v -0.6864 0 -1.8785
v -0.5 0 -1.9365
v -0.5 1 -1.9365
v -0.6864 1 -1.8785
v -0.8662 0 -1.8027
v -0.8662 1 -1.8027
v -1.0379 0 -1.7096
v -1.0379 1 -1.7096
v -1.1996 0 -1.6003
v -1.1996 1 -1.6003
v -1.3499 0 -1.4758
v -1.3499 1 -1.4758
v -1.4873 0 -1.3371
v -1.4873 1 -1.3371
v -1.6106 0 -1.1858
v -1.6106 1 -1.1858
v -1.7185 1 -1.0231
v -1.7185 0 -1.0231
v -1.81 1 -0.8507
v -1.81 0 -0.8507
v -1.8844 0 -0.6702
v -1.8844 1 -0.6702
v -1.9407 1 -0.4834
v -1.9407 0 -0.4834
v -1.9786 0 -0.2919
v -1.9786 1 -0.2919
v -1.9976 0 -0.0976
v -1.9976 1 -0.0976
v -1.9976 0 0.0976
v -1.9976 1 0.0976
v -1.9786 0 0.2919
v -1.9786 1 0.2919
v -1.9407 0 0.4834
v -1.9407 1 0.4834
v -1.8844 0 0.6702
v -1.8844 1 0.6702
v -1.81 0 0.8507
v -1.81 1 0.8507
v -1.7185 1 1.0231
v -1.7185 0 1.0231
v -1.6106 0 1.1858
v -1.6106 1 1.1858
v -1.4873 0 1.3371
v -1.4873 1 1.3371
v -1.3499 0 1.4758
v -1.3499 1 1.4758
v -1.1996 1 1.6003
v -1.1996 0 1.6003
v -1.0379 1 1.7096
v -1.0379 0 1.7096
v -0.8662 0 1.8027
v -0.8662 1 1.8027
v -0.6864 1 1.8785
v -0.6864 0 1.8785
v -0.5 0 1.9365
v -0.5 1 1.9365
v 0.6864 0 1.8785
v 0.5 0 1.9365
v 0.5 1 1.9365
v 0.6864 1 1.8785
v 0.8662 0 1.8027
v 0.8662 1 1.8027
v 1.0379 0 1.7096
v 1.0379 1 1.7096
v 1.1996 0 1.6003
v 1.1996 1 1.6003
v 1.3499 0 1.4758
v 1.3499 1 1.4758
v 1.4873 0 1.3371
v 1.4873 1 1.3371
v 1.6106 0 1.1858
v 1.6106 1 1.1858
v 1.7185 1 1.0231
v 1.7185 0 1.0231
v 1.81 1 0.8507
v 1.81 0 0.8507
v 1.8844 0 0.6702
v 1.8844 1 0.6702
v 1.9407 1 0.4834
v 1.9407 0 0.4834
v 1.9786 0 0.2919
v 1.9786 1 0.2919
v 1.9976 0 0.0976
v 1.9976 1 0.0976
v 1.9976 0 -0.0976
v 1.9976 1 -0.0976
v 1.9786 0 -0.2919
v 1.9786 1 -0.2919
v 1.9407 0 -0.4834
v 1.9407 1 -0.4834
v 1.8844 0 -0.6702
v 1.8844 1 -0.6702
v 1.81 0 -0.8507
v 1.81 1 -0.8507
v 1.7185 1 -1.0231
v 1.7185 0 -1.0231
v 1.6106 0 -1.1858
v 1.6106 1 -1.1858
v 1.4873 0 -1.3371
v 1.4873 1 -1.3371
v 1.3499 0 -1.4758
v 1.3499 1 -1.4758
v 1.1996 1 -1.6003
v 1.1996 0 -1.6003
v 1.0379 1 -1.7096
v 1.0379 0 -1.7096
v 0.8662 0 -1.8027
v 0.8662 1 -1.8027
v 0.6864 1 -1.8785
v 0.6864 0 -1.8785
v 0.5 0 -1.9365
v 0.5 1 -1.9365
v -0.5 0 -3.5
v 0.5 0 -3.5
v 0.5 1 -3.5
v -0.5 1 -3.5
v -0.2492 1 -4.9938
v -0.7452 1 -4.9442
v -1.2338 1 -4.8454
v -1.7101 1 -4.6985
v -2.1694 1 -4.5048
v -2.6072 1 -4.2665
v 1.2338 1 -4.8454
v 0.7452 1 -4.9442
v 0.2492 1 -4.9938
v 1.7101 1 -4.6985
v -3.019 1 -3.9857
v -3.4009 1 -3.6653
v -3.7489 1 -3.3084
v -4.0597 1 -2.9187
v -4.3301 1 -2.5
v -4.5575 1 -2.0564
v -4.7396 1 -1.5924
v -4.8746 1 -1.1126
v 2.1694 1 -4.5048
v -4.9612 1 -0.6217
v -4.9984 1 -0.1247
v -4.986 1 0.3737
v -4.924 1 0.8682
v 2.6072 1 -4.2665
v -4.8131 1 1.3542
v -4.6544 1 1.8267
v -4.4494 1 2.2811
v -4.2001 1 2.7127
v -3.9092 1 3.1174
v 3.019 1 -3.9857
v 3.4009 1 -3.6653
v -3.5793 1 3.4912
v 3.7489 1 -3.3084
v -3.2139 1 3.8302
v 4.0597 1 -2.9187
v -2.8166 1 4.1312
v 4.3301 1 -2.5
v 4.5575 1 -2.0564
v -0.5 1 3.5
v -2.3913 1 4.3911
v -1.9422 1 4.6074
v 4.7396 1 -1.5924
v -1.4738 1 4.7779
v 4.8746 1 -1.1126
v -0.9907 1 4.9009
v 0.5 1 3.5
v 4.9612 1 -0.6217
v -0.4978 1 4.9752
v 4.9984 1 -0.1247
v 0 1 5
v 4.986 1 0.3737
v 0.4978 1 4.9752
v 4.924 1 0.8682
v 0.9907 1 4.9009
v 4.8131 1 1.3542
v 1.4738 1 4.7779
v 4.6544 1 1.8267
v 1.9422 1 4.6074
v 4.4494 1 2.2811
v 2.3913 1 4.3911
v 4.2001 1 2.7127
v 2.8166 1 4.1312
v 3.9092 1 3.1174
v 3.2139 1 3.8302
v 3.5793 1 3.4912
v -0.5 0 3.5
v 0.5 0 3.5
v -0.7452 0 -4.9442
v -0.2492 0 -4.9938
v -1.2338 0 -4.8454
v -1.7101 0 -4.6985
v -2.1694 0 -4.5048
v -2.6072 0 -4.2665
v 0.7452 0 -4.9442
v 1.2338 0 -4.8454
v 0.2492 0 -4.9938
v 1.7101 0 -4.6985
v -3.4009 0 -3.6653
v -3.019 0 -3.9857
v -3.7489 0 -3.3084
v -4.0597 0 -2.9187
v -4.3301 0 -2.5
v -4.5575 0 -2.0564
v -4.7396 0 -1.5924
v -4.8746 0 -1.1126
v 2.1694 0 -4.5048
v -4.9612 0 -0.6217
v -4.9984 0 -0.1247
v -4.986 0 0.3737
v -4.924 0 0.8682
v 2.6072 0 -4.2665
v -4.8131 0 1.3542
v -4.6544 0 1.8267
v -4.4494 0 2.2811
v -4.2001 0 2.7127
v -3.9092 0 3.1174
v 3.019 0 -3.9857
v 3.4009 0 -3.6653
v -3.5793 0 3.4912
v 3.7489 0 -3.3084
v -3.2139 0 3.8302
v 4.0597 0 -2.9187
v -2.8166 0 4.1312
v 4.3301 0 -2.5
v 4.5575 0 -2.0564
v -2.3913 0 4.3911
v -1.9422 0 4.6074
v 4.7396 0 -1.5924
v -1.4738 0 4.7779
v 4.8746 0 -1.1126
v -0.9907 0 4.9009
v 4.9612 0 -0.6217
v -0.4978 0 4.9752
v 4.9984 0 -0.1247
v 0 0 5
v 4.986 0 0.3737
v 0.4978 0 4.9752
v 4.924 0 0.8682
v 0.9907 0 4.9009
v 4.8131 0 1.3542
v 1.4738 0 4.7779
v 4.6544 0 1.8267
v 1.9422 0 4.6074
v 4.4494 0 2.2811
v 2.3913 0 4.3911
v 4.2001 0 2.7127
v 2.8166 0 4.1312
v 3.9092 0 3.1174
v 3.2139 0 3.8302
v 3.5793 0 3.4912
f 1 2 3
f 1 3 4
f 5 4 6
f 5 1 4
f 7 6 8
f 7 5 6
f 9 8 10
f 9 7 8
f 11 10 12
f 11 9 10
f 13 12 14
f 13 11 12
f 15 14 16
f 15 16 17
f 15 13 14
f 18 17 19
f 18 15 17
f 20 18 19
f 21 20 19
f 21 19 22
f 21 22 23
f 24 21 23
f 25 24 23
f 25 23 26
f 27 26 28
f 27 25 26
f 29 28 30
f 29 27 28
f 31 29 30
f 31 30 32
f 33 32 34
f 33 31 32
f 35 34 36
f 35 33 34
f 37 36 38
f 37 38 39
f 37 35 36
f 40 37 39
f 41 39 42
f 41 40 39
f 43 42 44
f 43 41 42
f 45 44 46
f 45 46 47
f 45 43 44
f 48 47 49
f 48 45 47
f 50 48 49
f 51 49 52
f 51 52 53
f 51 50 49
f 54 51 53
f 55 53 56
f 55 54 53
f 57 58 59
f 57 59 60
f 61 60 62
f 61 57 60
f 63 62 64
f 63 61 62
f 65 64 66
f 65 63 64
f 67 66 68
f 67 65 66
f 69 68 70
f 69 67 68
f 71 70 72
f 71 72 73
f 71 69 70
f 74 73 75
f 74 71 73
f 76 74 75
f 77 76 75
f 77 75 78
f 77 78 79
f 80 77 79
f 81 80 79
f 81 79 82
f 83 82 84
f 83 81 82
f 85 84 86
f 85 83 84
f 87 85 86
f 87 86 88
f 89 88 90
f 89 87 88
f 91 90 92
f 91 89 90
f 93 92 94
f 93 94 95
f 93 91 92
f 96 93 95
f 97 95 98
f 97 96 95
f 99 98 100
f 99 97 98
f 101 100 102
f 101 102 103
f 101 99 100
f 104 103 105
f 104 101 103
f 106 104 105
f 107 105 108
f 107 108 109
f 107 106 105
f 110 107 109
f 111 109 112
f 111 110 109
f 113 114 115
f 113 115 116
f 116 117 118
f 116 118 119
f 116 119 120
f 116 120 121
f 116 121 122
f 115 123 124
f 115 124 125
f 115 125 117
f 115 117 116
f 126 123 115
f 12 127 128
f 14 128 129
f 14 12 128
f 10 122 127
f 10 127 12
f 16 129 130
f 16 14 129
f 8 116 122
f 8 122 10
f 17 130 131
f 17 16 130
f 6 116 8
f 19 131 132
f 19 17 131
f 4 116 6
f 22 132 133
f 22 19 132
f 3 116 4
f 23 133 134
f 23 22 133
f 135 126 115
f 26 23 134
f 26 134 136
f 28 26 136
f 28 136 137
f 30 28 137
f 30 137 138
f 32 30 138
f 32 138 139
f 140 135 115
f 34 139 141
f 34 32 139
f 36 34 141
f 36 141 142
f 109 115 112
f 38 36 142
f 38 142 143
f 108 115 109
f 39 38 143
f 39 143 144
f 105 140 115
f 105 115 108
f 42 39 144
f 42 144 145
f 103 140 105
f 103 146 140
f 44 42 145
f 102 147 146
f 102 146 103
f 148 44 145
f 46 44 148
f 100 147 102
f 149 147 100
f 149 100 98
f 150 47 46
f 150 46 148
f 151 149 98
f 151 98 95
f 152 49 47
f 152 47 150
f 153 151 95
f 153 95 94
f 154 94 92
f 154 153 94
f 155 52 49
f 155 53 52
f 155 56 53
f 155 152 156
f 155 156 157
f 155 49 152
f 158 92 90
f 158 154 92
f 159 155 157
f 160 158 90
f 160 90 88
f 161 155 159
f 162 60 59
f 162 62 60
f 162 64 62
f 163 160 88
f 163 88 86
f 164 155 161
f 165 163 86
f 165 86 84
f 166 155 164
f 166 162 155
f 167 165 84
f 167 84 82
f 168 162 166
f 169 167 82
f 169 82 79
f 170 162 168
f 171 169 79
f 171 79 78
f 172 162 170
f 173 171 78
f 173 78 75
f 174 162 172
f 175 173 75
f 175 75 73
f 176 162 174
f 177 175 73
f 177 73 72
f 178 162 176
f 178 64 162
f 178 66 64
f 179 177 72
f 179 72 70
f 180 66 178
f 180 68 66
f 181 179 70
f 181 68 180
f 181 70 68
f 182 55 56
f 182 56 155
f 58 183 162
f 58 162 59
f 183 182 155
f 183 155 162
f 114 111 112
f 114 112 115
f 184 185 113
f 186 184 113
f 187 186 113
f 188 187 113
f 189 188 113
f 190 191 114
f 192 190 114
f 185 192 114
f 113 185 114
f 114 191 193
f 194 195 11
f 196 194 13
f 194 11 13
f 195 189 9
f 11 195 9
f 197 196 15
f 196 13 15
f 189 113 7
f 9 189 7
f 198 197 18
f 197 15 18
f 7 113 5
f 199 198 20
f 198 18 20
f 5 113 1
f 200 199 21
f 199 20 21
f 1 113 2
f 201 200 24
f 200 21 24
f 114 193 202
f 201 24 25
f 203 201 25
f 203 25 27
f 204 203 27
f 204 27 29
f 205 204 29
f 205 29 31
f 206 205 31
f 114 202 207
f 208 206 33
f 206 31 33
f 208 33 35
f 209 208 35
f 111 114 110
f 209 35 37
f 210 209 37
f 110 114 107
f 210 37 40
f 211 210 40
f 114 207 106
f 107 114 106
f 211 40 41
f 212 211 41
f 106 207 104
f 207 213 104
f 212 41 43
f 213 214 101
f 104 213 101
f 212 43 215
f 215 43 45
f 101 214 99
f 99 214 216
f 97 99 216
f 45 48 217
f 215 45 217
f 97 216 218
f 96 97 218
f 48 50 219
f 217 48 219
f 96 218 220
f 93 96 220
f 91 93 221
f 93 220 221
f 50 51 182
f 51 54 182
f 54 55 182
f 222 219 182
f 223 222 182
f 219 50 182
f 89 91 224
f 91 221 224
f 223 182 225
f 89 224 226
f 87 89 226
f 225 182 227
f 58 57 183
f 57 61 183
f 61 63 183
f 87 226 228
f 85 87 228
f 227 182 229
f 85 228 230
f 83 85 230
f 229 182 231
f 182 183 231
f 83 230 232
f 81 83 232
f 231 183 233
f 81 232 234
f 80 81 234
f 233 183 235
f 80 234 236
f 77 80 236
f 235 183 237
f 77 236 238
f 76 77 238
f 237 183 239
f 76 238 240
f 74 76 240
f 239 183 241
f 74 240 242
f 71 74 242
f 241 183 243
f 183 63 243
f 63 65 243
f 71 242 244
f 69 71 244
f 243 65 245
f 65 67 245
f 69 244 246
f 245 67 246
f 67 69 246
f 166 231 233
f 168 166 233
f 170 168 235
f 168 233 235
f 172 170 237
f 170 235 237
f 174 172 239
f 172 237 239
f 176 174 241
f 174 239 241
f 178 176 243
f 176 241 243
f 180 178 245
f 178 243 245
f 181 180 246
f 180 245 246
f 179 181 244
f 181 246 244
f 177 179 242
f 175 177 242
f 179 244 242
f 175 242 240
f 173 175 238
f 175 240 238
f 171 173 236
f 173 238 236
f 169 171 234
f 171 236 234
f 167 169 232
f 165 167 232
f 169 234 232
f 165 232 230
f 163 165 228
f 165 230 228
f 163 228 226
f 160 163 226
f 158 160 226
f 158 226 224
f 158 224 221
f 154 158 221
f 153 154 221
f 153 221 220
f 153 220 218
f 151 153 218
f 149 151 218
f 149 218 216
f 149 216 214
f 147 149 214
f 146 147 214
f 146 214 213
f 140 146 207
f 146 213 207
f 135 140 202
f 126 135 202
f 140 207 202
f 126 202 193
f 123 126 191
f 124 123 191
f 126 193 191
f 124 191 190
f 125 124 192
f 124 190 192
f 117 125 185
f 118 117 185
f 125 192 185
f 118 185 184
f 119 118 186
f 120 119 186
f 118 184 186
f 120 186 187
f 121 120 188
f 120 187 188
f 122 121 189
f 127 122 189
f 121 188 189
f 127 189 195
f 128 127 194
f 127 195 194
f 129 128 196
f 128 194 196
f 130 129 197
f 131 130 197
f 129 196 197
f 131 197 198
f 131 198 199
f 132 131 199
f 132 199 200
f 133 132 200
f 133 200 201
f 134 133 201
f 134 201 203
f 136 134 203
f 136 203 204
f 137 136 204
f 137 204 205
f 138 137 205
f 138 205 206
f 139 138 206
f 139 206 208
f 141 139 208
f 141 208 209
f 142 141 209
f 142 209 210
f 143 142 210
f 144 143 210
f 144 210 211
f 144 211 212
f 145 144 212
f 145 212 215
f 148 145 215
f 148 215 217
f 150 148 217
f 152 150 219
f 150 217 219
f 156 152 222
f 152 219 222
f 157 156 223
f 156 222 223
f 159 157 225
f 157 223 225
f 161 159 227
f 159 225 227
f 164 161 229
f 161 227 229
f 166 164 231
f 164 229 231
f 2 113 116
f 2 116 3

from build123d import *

# Parameters (mm, degrees)
SKETCH1_R           = 5
BOSS_EXTRUDE1_DEPTH = 1


with BuildPart() as part:
    # Sketch1 → Boss-Extrude1 (new body)
    with BuildSketch(Plane(origin=(0, 0, 0), x_dir=(1, 0, 0), z_dir=(0, 1, 0))):
        with Locations(Location((0, 0, 0), (0, 0, 270))):
            Circle(SKETCH1_R)
        with BuildLine():
            Line((0.5, 1.936491673), (0.5, 3.5))
            Line((0.5, 3.5), (-0.5, 3.5))
            Line((-0.5, 3.5), (-0.5, 1.936491673))
            ThreePointArc((-0.5, 1.936491673), (-2, 0), (-0.5, -1.936491673))
            Line((-0.5, -1.936491673), (-0.5, -3.5))
            Line((-0.5, -3.5), (0.5, -3.5))
            Line((0.5, -3.5), (0.5, -1.936491673))
            ThreePointArc((0.5, -1.936491673), (2, 0), (0.5, 1.936491673))
        make_face(mode=Mode.SUBTRACT)
    extrude(amount=BOSS_EXTRUDE1_DEPTH)


solid = part.part
